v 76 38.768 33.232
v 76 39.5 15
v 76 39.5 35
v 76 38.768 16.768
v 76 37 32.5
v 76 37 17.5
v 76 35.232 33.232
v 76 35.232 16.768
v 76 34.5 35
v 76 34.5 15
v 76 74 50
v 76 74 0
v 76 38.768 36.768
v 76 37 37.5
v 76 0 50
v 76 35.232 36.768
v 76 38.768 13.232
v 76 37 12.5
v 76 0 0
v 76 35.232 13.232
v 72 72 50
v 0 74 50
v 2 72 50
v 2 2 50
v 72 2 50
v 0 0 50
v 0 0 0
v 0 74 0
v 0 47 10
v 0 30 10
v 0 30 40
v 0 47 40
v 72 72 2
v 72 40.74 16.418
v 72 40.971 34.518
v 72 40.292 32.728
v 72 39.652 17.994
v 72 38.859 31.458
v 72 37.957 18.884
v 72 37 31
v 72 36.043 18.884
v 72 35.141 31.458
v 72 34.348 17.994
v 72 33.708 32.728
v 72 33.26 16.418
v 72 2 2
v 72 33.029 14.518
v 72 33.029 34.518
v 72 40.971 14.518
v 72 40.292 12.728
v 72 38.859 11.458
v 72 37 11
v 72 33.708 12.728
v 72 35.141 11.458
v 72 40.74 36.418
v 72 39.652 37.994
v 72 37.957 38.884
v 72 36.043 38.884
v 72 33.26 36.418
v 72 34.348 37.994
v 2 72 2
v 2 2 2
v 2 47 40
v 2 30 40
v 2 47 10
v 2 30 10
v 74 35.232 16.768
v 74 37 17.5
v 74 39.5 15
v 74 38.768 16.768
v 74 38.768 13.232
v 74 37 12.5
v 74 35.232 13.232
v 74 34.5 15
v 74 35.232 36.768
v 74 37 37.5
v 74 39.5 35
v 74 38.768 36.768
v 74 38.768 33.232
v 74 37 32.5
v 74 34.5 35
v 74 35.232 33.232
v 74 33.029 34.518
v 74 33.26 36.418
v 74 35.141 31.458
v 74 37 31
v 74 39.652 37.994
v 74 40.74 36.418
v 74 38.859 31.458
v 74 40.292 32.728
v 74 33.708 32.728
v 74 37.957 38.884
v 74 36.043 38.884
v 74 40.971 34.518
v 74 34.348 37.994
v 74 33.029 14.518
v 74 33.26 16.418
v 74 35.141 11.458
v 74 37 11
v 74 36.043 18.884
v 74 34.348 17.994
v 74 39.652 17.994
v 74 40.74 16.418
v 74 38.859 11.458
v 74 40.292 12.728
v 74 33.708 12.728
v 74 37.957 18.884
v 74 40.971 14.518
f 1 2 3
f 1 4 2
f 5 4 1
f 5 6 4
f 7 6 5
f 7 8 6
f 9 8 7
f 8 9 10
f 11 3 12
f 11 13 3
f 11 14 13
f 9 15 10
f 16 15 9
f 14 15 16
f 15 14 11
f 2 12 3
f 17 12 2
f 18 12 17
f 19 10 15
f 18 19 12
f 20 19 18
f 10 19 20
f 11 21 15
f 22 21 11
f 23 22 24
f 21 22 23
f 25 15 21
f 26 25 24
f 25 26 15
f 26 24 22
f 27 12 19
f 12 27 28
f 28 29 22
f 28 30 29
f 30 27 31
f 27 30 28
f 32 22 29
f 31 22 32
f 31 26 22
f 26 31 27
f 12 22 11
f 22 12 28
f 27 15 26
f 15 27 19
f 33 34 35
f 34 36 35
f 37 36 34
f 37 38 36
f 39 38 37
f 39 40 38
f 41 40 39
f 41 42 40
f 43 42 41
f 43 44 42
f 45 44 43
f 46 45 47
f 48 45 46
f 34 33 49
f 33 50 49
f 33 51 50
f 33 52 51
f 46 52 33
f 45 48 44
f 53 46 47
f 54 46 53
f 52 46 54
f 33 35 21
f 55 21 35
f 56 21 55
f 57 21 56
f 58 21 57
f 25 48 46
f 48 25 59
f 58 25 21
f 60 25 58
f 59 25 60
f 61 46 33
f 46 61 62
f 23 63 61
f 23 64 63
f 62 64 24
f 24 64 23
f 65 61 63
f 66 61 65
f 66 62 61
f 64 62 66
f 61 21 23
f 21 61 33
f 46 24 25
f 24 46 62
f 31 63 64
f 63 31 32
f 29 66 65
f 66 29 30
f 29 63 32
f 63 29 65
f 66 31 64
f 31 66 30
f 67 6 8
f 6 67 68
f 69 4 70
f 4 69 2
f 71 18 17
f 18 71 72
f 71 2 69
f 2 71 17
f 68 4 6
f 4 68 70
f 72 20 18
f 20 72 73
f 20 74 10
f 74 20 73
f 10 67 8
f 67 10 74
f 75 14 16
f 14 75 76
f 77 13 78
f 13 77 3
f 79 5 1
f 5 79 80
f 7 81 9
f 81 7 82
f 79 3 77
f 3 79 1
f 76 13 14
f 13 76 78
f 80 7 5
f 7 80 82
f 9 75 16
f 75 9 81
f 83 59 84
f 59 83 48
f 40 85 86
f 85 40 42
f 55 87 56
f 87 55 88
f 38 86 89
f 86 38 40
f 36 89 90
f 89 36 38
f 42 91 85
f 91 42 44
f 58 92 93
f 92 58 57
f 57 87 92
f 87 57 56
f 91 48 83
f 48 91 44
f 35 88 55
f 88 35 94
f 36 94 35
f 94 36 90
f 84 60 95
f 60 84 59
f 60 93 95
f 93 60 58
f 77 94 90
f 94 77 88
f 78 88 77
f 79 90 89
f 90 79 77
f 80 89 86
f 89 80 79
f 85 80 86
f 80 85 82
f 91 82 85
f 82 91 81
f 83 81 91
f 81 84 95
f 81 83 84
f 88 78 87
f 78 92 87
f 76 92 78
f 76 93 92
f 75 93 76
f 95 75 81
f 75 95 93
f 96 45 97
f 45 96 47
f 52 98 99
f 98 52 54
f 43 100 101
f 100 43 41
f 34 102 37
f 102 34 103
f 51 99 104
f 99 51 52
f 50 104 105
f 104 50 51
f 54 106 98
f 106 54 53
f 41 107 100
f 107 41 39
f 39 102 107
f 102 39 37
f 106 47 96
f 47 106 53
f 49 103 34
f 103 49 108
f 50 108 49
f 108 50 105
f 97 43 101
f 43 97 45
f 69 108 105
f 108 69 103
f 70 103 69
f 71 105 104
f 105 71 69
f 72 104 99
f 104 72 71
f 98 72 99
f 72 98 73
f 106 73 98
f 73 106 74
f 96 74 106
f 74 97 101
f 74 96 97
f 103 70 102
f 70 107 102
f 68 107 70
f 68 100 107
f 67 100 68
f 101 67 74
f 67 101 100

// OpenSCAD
difference()
{
    cube([76,74,50]);
    translate([2,2,2]) cube([70,70,110]);
    translate([-2,30,10]) cube([10,17,30]);
    translate([65,37,15]) rotate([0,90,0]) cylinder(h=15,d=5);
    translate([65,37,35]) rotate([0,90,0]) cylinder(h=15,d=5);
    translate([71,37,35]) rotate([0,90,0]) cylinder(h=3,d=8);
    translate([71,37,15]) rotate([0,90,0]) cylinder(h=3,d=8);
}
